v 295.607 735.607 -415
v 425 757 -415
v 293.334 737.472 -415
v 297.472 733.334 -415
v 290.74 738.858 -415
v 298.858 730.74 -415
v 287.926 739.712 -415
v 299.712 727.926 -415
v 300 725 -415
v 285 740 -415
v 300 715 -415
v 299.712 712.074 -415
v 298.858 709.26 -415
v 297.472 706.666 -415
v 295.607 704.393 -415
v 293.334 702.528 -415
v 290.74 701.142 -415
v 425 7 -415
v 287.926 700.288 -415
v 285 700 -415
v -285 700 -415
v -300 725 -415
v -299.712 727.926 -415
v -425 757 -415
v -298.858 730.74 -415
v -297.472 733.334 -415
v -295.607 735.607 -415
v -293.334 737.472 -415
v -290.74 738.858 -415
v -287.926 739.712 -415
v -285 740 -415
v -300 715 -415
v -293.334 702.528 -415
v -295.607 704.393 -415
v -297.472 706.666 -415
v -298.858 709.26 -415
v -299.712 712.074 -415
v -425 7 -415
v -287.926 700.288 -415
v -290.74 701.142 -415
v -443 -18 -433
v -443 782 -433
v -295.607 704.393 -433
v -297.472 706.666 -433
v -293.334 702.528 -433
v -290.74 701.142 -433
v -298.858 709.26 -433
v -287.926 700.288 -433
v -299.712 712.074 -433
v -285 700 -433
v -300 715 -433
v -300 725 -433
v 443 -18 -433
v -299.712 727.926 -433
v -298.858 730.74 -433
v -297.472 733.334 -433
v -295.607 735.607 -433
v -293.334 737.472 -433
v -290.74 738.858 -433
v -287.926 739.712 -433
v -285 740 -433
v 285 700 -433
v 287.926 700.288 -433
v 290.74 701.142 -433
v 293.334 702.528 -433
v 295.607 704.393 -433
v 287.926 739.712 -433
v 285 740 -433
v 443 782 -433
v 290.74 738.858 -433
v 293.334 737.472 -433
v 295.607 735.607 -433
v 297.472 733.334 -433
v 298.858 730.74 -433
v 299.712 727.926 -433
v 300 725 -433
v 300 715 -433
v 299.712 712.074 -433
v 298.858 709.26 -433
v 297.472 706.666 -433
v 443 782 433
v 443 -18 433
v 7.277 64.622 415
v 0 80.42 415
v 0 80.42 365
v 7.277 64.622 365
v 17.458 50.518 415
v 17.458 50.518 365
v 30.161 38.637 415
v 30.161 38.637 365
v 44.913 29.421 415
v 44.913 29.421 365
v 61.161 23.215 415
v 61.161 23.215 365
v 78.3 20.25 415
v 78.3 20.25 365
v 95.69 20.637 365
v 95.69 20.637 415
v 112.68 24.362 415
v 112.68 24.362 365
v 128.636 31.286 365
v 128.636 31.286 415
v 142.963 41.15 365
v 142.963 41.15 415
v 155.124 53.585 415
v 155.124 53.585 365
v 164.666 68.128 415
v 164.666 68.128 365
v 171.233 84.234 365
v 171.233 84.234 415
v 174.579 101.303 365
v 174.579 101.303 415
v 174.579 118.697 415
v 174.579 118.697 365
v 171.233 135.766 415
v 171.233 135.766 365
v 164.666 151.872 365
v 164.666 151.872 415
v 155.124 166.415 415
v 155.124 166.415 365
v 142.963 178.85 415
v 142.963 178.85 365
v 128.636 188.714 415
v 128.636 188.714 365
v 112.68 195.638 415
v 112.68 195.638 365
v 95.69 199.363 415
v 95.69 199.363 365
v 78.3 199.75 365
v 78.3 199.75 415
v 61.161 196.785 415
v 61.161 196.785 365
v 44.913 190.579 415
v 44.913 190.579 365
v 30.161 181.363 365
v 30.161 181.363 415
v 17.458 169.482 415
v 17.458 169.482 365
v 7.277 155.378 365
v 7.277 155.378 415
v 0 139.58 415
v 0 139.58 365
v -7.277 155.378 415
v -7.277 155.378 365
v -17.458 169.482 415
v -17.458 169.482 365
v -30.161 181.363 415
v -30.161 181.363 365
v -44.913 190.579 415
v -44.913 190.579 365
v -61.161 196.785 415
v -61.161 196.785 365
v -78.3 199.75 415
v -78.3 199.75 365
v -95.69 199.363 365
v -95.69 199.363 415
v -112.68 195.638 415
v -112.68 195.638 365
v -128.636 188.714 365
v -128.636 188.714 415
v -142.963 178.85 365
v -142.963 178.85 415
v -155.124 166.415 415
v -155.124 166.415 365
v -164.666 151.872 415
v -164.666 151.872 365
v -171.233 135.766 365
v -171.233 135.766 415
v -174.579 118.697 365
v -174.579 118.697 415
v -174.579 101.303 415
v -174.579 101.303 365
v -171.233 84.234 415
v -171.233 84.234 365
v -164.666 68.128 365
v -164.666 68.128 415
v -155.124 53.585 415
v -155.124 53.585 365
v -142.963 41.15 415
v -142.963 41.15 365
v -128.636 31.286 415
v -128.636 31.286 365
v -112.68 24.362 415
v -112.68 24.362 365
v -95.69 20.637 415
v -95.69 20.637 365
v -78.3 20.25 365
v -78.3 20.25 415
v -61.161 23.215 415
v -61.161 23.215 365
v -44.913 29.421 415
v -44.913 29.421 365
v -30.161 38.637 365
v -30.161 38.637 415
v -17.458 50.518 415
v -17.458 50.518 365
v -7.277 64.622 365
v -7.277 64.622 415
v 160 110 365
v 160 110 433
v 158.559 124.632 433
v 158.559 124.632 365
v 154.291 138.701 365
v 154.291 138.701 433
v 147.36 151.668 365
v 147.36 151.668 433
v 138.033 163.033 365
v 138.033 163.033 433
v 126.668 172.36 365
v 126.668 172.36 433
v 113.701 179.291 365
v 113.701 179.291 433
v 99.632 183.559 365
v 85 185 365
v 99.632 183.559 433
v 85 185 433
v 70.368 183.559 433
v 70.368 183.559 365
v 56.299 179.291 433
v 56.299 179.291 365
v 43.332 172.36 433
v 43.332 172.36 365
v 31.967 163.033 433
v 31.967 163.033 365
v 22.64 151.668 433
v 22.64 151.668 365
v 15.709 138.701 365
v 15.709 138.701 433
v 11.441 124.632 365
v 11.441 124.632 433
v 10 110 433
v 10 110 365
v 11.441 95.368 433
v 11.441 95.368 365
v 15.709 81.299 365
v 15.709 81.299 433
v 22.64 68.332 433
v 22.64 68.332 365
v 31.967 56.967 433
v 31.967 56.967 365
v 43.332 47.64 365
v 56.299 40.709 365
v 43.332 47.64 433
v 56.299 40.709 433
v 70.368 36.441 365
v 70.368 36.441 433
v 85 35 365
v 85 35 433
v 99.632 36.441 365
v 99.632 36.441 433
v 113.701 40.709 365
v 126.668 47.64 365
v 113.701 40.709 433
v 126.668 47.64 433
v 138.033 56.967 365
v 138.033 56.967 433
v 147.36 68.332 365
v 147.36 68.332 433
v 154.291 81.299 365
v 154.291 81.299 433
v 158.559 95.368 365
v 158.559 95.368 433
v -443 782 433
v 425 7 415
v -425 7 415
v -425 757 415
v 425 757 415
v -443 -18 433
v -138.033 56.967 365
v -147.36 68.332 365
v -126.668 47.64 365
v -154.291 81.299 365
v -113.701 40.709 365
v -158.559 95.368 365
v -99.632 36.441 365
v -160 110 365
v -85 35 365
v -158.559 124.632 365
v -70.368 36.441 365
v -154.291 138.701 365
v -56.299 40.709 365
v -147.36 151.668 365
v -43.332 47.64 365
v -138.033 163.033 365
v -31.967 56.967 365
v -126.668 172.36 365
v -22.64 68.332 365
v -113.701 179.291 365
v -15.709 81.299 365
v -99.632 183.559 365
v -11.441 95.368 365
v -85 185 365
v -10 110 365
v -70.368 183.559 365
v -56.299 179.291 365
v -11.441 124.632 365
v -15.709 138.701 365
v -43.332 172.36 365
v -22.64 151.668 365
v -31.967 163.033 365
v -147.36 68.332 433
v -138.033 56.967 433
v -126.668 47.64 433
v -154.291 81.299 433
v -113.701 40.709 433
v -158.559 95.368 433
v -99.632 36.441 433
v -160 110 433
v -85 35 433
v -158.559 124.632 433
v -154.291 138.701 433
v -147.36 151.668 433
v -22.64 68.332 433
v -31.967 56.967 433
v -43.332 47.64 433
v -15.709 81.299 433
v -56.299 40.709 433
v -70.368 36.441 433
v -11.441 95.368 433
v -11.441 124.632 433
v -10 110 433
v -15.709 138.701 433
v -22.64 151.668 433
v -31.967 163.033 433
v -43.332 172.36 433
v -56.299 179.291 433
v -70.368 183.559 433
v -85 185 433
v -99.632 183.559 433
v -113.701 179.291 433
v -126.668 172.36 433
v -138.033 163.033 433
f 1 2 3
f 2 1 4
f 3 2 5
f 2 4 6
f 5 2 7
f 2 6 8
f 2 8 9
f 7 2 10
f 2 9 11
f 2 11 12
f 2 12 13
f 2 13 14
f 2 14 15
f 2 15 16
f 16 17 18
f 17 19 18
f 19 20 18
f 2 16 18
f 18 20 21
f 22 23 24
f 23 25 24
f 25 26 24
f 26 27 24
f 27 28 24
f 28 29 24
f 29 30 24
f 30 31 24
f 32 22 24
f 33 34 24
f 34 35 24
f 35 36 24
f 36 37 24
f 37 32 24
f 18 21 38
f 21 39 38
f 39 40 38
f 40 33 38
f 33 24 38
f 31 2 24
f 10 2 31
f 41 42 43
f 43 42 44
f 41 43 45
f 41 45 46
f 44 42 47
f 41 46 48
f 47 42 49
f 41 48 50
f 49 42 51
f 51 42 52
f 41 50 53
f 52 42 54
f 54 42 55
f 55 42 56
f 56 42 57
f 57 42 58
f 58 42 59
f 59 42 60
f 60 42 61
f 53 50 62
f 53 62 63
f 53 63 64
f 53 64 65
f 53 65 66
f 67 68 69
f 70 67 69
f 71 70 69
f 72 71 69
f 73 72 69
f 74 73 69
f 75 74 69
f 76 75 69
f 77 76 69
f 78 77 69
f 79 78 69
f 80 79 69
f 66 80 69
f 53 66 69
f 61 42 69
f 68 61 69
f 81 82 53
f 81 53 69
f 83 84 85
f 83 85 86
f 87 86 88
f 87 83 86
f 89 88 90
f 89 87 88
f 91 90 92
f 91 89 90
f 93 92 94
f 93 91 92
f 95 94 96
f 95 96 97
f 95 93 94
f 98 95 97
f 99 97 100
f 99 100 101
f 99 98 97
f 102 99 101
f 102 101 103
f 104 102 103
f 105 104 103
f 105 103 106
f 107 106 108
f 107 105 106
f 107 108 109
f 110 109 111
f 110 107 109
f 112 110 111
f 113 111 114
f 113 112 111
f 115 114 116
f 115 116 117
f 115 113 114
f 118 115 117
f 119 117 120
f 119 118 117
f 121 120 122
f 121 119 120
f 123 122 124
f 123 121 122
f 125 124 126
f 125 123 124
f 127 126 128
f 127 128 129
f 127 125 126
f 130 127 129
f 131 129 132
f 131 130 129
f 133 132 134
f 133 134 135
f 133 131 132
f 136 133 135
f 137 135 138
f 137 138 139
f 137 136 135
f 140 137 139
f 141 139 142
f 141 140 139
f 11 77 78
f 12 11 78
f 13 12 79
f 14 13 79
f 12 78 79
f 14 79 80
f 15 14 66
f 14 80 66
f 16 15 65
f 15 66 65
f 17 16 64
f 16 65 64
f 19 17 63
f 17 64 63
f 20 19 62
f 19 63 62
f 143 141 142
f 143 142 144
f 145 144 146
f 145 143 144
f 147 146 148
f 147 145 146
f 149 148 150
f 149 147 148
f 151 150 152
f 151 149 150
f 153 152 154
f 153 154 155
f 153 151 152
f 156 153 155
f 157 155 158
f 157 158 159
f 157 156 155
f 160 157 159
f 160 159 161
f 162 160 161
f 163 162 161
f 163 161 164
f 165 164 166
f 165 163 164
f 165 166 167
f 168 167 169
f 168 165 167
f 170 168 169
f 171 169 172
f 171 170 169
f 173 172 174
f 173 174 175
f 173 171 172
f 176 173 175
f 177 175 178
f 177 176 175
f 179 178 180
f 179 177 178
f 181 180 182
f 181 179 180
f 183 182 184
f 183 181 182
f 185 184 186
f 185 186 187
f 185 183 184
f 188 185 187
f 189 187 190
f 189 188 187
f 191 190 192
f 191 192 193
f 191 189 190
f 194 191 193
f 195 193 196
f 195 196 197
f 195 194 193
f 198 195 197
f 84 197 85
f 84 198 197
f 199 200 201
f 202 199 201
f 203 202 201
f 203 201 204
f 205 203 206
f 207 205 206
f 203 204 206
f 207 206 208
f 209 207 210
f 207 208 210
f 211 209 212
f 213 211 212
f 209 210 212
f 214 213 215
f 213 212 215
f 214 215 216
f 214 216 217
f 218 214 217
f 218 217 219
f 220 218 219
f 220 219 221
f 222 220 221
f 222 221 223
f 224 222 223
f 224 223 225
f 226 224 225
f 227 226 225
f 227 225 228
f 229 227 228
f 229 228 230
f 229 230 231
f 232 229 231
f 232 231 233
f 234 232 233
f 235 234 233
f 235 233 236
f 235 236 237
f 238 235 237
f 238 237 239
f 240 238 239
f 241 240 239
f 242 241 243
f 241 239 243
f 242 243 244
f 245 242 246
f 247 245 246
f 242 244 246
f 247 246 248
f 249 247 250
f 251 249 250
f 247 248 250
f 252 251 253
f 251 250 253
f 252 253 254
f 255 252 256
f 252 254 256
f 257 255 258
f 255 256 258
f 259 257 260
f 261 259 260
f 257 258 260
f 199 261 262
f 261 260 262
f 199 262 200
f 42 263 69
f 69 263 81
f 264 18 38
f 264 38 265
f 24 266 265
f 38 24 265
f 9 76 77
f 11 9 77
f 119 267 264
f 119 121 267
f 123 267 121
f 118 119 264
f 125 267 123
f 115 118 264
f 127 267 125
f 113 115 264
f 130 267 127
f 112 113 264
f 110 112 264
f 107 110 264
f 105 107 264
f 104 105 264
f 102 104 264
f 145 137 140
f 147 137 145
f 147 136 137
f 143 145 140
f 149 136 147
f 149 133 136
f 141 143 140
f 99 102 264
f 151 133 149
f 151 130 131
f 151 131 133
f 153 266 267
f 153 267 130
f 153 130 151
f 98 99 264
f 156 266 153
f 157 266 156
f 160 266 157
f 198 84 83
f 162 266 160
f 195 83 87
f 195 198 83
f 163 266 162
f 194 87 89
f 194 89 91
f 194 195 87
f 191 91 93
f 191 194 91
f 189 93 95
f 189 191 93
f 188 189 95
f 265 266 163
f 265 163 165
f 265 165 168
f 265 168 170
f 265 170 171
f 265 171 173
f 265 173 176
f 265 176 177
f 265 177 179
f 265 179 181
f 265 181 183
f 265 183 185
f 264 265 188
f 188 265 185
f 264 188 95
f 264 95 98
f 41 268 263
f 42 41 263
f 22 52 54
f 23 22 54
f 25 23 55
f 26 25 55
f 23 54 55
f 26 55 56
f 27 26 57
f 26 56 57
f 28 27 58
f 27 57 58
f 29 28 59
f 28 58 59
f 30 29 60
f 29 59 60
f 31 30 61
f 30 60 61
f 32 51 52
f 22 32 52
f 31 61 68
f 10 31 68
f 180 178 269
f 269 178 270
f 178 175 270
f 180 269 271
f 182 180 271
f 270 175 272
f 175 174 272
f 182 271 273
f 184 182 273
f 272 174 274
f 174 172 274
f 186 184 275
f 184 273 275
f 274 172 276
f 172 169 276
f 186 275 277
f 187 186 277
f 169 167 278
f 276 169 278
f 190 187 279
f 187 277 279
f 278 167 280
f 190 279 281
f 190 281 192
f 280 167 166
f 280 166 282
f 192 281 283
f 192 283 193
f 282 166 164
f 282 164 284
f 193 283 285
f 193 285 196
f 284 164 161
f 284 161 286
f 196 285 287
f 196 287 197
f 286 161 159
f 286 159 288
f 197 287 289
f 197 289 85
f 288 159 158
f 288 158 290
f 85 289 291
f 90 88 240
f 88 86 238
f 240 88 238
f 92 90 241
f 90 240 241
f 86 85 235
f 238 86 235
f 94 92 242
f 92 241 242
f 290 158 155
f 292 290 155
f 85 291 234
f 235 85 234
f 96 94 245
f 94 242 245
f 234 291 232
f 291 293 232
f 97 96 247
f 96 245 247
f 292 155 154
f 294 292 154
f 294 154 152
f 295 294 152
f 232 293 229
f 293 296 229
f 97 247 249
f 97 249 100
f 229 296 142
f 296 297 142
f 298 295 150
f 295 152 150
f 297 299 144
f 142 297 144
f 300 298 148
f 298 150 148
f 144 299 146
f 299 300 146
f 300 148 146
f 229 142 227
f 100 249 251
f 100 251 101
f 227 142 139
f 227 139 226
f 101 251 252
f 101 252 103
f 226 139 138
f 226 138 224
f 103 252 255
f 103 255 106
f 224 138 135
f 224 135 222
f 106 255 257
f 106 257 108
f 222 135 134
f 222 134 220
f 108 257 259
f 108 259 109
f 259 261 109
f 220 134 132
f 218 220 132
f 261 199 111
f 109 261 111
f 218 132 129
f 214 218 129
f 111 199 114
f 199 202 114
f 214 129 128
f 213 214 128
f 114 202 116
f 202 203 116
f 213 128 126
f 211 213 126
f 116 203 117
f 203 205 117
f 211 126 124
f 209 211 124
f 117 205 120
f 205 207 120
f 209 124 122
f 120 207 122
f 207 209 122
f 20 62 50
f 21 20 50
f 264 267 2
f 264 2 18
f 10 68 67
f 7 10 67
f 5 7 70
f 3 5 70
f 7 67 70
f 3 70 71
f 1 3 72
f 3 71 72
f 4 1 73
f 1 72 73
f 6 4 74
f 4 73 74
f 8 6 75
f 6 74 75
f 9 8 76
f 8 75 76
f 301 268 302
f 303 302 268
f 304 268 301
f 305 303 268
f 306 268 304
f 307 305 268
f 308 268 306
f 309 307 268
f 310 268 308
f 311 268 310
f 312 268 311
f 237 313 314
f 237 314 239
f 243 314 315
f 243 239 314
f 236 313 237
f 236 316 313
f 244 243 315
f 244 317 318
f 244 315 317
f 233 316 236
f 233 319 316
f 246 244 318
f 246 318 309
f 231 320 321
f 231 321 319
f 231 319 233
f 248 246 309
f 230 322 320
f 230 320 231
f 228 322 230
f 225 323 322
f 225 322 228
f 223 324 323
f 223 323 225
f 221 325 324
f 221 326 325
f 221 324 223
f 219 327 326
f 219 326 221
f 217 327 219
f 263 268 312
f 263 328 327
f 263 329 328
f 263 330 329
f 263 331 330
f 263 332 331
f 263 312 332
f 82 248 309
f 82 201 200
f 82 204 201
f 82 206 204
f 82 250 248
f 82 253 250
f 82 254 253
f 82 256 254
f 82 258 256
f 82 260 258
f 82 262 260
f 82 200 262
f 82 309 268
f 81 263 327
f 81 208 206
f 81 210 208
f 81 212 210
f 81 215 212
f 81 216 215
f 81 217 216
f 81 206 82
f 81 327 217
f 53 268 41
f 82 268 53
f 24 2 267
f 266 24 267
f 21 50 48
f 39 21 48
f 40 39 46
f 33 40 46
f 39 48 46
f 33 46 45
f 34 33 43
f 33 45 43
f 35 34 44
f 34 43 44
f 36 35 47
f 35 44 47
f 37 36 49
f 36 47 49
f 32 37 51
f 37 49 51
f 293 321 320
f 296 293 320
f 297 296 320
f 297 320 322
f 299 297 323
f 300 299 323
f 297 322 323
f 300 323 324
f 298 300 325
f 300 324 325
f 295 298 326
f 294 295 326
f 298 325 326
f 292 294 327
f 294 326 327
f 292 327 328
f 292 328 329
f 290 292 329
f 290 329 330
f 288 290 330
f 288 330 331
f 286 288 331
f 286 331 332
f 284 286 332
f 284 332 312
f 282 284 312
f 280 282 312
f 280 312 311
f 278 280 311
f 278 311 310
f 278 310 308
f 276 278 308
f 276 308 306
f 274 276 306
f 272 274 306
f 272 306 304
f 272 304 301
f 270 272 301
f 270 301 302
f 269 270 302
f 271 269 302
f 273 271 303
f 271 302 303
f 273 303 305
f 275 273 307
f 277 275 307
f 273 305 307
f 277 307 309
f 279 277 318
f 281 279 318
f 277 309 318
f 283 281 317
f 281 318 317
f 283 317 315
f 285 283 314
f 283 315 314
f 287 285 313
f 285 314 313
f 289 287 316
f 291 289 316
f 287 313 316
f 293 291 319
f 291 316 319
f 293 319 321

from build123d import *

# Parameters (mm, degrees)
SKETCH1_W           = 886
SKETCH1_H           = 800
BOSS_EXTRUDE1_DEPTH = 866
SKETCH2_W           = 750
SKETCH2_H           = 830
CUT_EXTRUDE1_DEPTH  = 850
CUT_EXTRUDE2_DEPTH  = 288
BOSS_EXTRUDE2_DEPTH = 50
HOLE1_D             = 150
HOLE1_DEPTH         = 68


with BuildPart() as part:
    # Sketch1 → Boss-Extrude1 (new body)
    with BuildSketch(Plane.XY.offset(433)):
        with Locations((0, 382)):
            Rectangle(SKETCH1_W, SKETCH1_H)
    extrude(amount=-BOSS_EXTRUDE1_DEPTH)

    # Sketch2 → Cut-Extrude1 (cut)
    with BuildSketch(Plane(origin=(-425, 0, 0), x_dir=(0, -1, 0), z_dir=(-1, 0, 0))):
        with Locations((-382, 0)):
            Rectangle(SKETCH2_W, SKETCH2_H)
    extrude(amount=-CUT_EXTRUDE1_DEPTH, mode=Mode.SUBTRACT)

    # Sketch3 → Cut-Extrude2 (cut)
    with BuildSketch(Plane(origin=(0, 0, -433), x_dir=(-1, 0, 0), z_dir=(0, 0, -1))):
        with BuildLine():
            Line((-300, 725), (-300, 715))
            ThreePointArc((-300, 715), (-295.606601718, 704.393398282), (-285, 700))
            Line((-285, 700), (285, 700))
            ThreePointArc((285, 700), (295.606601718, 704.393398282), (300, 715))
            Line((300, 715), (300, 725))
            ThreePointArc((300, 725), (295.606601718, 735.606601718), (285, 740))
            Line((285, 740), (-285, 740))
            ThreePointArc((-285, 740), (-295.606601718, 735.606601718), (-300, 725))
        make_face()
    extrude(amount=-CUT_EXTRUDE2_DEPTH, mode=Mode.SUBTRACT)

    # Sketch4 → Boss-Extrude2 (add)
    with BuildSketch(Plane(origin=(0, 0, 415), x_dir=(-1, 0, 0), z_dir=(0, 0, -1))):
        with BuildLine():
            ThreePointArc((0, 80.419601085), (-175, 110), (0, 139.580398915))
            ThreePointArc((0, 139.580398915), (175, 110), (0, 80.419601085))
        make_face()
    extrude(amount=BOSS_EXTRUDE2_DEPTH)

    # Hole1
    with Locations(Plane(origin=(0, 0, 365), x_dir=(-1, 0, 0), z_dir=(0, 0, -1))):
        with Locations((-85, 110), (85, 110)):
            Hole(HOLE1_D / 2, depth=HOLE1_DEPTH)


solid = part.part
